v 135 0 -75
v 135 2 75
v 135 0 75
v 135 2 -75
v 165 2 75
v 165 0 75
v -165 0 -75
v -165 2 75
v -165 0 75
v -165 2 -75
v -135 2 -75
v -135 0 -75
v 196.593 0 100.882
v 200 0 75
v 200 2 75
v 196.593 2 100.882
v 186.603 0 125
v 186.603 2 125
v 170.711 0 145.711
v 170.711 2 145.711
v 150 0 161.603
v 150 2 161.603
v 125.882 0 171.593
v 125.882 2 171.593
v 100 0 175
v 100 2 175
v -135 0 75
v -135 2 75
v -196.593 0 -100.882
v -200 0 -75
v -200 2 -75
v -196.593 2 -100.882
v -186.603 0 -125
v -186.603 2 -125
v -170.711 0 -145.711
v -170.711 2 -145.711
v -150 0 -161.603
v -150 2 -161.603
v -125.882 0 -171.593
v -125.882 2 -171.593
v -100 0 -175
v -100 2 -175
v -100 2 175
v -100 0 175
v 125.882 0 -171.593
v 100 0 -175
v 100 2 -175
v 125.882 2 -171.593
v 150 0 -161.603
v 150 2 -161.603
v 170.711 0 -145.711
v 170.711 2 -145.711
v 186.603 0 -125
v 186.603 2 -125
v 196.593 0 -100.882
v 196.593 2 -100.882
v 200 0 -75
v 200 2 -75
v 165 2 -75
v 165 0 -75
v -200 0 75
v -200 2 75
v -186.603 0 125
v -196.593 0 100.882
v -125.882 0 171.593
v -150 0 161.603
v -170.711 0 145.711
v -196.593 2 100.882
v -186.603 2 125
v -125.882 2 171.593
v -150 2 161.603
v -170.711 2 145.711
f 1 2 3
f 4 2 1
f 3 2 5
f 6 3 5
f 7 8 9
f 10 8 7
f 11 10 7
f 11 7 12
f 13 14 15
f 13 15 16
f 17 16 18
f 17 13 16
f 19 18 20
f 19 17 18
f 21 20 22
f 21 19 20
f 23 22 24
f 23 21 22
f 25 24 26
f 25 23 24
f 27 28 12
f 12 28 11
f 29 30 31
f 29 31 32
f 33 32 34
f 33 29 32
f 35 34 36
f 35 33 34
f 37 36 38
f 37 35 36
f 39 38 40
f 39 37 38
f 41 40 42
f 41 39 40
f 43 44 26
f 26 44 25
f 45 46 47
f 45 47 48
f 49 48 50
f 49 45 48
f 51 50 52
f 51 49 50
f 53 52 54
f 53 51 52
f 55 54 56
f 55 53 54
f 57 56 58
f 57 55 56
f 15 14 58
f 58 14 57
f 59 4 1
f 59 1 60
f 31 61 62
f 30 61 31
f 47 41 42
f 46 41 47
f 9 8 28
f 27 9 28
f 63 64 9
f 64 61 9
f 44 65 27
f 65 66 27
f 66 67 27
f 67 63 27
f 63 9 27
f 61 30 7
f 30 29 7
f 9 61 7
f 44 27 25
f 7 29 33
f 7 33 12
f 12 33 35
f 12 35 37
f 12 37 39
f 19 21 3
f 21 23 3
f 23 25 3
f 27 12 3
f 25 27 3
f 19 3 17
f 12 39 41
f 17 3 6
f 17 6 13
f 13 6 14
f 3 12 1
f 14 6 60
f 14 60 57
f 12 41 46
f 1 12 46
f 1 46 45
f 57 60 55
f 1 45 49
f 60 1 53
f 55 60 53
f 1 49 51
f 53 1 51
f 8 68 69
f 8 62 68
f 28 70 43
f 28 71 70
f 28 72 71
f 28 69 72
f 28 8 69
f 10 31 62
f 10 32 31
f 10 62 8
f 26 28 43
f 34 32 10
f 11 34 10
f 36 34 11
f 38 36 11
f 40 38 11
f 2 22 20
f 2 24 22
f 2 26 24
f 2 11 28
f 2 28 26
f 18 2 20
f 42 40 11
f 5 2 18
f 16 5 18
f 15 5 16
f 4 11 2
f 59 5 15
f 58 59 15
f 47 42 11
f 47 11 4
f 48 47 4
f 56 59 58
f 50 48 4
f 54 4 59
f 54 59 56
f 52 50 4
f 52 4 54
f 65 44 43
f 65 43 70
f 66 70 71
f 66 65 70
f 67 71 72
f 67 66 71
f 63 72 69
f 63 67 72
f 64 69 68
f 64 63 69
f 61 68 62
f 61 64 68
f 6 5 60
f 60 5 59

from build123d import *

# Parameters (mm, degrees)
SKETCH2_W           = 400
SKETCH2_H           = 350
BASE_FLANGE1_DEPTH  = 2
CUT_EXTRUDE1_REACH  = 267.761
SKETCH7_W           = 30
SKETCH7_H           = 150
BREAK_CORNER1_DEPTH = 2


# Read off the part's stored shape, not the designer's step: Break-Corner1
# Sheet-metal steps are written as plain solids
with BuildPart() as part:
    # Sketch2 → Base-Flange1 (new body)
    with BuildSketch(Plane(origin=(0, 0, 0), x_dir=(1, 0, 0), z_dir=(0, 1, 0))):
        Rectangle(SKETCH2_W, SKETCH2_H)
    extrude(amount=BASE_FLANGE1_DEPTH)

    # Sketch7 → Cut-Extrude1 (cut, up to next)
    with BuildSketch(Plane(origin=(0, 2, 0), x_dir=(1, 0, 0), z_dir=(0, 1, 0)), mode=Mode.PRIVATE) as cut_extrude1_sk1:
        with Locations((-150, 0)):
            Rectangle(SKETCH7_W, SKETCH7_H)
    cut_extrude1_tool1 = extrude(cut_extrude1_sk1.sketch, amount=-CUT_EXTRUDE1_REACH, mode=Mode.PRIVATE) & part.part
    # Sketch7 → Cut-Extrude1 (cut, up to next)
    with BuildSketch(Plane(origin=(0, 2, 0), x_dir=(1, 0, 0), z_dir=(0, 1, 0)), mode=Mode.PRIVATE) as cut_extrude1_sk2:
        with Locations((150, 0)):
            Rectangle(SKETCH7_W, SKETCH7_H)
    cut_extrude1_tool2 = extrude(cut_extrude1_sk2.sketch, amount=-CUT_EXTRUDE1_REACH, mode=Mode.PRIVATE) & part.part
    add(cut_extrude1_tool1.solids().sort_by_distance((-150, 2, 0))[0], mode=Mode.SUBTRACT)
    add(cut_extrude1_tool2.solids().sort_by_distance((150, 2, 0))[0], mode=Mode.SUBTRACT)

    # Break-Corner1 outline → Break-Corner1 (cut)
    with BuildSketch(Plane(origin=(0, 0, 0), x_dir=(1, 0, 0), z_dir=(0, 1, 0))):
        with BuildLine():
            Line((-200, 175), (-200, 75))
            ThreePointArc((-200, 75), (-170.710678119, 145.710678119), (-100, 175))
            Line((-100, 175), (-200, 175))
        make_face()
        with BuildLine():
            ThreePointArc((-100, -175), (-170.710678119, -145.710678119), (-200, -75))
            Line((-200, -75), (-200, -175))
            Line((-200, -175), (-100, -175))
        make_face()
        with BuildLine():
            Line((200, 175), (100, 175))
            ThreePointArc((100, 175), (170.710678119, 145.710678119), (200, 75))
            Line((200, 75), (200, 175))
        make_face()
        with BuildLine():
            ThreePointArc((200, -75), (170.710678119, -145.710678119), (100, -175))
            Line((100, -175), (200, -175))
            Line((200, -175), (200, -75))
        make_face()
    extrude(amount=BREAK_CORNER1_DEPTH, mode=Mode.SUBTRACT)


solid = part.part
